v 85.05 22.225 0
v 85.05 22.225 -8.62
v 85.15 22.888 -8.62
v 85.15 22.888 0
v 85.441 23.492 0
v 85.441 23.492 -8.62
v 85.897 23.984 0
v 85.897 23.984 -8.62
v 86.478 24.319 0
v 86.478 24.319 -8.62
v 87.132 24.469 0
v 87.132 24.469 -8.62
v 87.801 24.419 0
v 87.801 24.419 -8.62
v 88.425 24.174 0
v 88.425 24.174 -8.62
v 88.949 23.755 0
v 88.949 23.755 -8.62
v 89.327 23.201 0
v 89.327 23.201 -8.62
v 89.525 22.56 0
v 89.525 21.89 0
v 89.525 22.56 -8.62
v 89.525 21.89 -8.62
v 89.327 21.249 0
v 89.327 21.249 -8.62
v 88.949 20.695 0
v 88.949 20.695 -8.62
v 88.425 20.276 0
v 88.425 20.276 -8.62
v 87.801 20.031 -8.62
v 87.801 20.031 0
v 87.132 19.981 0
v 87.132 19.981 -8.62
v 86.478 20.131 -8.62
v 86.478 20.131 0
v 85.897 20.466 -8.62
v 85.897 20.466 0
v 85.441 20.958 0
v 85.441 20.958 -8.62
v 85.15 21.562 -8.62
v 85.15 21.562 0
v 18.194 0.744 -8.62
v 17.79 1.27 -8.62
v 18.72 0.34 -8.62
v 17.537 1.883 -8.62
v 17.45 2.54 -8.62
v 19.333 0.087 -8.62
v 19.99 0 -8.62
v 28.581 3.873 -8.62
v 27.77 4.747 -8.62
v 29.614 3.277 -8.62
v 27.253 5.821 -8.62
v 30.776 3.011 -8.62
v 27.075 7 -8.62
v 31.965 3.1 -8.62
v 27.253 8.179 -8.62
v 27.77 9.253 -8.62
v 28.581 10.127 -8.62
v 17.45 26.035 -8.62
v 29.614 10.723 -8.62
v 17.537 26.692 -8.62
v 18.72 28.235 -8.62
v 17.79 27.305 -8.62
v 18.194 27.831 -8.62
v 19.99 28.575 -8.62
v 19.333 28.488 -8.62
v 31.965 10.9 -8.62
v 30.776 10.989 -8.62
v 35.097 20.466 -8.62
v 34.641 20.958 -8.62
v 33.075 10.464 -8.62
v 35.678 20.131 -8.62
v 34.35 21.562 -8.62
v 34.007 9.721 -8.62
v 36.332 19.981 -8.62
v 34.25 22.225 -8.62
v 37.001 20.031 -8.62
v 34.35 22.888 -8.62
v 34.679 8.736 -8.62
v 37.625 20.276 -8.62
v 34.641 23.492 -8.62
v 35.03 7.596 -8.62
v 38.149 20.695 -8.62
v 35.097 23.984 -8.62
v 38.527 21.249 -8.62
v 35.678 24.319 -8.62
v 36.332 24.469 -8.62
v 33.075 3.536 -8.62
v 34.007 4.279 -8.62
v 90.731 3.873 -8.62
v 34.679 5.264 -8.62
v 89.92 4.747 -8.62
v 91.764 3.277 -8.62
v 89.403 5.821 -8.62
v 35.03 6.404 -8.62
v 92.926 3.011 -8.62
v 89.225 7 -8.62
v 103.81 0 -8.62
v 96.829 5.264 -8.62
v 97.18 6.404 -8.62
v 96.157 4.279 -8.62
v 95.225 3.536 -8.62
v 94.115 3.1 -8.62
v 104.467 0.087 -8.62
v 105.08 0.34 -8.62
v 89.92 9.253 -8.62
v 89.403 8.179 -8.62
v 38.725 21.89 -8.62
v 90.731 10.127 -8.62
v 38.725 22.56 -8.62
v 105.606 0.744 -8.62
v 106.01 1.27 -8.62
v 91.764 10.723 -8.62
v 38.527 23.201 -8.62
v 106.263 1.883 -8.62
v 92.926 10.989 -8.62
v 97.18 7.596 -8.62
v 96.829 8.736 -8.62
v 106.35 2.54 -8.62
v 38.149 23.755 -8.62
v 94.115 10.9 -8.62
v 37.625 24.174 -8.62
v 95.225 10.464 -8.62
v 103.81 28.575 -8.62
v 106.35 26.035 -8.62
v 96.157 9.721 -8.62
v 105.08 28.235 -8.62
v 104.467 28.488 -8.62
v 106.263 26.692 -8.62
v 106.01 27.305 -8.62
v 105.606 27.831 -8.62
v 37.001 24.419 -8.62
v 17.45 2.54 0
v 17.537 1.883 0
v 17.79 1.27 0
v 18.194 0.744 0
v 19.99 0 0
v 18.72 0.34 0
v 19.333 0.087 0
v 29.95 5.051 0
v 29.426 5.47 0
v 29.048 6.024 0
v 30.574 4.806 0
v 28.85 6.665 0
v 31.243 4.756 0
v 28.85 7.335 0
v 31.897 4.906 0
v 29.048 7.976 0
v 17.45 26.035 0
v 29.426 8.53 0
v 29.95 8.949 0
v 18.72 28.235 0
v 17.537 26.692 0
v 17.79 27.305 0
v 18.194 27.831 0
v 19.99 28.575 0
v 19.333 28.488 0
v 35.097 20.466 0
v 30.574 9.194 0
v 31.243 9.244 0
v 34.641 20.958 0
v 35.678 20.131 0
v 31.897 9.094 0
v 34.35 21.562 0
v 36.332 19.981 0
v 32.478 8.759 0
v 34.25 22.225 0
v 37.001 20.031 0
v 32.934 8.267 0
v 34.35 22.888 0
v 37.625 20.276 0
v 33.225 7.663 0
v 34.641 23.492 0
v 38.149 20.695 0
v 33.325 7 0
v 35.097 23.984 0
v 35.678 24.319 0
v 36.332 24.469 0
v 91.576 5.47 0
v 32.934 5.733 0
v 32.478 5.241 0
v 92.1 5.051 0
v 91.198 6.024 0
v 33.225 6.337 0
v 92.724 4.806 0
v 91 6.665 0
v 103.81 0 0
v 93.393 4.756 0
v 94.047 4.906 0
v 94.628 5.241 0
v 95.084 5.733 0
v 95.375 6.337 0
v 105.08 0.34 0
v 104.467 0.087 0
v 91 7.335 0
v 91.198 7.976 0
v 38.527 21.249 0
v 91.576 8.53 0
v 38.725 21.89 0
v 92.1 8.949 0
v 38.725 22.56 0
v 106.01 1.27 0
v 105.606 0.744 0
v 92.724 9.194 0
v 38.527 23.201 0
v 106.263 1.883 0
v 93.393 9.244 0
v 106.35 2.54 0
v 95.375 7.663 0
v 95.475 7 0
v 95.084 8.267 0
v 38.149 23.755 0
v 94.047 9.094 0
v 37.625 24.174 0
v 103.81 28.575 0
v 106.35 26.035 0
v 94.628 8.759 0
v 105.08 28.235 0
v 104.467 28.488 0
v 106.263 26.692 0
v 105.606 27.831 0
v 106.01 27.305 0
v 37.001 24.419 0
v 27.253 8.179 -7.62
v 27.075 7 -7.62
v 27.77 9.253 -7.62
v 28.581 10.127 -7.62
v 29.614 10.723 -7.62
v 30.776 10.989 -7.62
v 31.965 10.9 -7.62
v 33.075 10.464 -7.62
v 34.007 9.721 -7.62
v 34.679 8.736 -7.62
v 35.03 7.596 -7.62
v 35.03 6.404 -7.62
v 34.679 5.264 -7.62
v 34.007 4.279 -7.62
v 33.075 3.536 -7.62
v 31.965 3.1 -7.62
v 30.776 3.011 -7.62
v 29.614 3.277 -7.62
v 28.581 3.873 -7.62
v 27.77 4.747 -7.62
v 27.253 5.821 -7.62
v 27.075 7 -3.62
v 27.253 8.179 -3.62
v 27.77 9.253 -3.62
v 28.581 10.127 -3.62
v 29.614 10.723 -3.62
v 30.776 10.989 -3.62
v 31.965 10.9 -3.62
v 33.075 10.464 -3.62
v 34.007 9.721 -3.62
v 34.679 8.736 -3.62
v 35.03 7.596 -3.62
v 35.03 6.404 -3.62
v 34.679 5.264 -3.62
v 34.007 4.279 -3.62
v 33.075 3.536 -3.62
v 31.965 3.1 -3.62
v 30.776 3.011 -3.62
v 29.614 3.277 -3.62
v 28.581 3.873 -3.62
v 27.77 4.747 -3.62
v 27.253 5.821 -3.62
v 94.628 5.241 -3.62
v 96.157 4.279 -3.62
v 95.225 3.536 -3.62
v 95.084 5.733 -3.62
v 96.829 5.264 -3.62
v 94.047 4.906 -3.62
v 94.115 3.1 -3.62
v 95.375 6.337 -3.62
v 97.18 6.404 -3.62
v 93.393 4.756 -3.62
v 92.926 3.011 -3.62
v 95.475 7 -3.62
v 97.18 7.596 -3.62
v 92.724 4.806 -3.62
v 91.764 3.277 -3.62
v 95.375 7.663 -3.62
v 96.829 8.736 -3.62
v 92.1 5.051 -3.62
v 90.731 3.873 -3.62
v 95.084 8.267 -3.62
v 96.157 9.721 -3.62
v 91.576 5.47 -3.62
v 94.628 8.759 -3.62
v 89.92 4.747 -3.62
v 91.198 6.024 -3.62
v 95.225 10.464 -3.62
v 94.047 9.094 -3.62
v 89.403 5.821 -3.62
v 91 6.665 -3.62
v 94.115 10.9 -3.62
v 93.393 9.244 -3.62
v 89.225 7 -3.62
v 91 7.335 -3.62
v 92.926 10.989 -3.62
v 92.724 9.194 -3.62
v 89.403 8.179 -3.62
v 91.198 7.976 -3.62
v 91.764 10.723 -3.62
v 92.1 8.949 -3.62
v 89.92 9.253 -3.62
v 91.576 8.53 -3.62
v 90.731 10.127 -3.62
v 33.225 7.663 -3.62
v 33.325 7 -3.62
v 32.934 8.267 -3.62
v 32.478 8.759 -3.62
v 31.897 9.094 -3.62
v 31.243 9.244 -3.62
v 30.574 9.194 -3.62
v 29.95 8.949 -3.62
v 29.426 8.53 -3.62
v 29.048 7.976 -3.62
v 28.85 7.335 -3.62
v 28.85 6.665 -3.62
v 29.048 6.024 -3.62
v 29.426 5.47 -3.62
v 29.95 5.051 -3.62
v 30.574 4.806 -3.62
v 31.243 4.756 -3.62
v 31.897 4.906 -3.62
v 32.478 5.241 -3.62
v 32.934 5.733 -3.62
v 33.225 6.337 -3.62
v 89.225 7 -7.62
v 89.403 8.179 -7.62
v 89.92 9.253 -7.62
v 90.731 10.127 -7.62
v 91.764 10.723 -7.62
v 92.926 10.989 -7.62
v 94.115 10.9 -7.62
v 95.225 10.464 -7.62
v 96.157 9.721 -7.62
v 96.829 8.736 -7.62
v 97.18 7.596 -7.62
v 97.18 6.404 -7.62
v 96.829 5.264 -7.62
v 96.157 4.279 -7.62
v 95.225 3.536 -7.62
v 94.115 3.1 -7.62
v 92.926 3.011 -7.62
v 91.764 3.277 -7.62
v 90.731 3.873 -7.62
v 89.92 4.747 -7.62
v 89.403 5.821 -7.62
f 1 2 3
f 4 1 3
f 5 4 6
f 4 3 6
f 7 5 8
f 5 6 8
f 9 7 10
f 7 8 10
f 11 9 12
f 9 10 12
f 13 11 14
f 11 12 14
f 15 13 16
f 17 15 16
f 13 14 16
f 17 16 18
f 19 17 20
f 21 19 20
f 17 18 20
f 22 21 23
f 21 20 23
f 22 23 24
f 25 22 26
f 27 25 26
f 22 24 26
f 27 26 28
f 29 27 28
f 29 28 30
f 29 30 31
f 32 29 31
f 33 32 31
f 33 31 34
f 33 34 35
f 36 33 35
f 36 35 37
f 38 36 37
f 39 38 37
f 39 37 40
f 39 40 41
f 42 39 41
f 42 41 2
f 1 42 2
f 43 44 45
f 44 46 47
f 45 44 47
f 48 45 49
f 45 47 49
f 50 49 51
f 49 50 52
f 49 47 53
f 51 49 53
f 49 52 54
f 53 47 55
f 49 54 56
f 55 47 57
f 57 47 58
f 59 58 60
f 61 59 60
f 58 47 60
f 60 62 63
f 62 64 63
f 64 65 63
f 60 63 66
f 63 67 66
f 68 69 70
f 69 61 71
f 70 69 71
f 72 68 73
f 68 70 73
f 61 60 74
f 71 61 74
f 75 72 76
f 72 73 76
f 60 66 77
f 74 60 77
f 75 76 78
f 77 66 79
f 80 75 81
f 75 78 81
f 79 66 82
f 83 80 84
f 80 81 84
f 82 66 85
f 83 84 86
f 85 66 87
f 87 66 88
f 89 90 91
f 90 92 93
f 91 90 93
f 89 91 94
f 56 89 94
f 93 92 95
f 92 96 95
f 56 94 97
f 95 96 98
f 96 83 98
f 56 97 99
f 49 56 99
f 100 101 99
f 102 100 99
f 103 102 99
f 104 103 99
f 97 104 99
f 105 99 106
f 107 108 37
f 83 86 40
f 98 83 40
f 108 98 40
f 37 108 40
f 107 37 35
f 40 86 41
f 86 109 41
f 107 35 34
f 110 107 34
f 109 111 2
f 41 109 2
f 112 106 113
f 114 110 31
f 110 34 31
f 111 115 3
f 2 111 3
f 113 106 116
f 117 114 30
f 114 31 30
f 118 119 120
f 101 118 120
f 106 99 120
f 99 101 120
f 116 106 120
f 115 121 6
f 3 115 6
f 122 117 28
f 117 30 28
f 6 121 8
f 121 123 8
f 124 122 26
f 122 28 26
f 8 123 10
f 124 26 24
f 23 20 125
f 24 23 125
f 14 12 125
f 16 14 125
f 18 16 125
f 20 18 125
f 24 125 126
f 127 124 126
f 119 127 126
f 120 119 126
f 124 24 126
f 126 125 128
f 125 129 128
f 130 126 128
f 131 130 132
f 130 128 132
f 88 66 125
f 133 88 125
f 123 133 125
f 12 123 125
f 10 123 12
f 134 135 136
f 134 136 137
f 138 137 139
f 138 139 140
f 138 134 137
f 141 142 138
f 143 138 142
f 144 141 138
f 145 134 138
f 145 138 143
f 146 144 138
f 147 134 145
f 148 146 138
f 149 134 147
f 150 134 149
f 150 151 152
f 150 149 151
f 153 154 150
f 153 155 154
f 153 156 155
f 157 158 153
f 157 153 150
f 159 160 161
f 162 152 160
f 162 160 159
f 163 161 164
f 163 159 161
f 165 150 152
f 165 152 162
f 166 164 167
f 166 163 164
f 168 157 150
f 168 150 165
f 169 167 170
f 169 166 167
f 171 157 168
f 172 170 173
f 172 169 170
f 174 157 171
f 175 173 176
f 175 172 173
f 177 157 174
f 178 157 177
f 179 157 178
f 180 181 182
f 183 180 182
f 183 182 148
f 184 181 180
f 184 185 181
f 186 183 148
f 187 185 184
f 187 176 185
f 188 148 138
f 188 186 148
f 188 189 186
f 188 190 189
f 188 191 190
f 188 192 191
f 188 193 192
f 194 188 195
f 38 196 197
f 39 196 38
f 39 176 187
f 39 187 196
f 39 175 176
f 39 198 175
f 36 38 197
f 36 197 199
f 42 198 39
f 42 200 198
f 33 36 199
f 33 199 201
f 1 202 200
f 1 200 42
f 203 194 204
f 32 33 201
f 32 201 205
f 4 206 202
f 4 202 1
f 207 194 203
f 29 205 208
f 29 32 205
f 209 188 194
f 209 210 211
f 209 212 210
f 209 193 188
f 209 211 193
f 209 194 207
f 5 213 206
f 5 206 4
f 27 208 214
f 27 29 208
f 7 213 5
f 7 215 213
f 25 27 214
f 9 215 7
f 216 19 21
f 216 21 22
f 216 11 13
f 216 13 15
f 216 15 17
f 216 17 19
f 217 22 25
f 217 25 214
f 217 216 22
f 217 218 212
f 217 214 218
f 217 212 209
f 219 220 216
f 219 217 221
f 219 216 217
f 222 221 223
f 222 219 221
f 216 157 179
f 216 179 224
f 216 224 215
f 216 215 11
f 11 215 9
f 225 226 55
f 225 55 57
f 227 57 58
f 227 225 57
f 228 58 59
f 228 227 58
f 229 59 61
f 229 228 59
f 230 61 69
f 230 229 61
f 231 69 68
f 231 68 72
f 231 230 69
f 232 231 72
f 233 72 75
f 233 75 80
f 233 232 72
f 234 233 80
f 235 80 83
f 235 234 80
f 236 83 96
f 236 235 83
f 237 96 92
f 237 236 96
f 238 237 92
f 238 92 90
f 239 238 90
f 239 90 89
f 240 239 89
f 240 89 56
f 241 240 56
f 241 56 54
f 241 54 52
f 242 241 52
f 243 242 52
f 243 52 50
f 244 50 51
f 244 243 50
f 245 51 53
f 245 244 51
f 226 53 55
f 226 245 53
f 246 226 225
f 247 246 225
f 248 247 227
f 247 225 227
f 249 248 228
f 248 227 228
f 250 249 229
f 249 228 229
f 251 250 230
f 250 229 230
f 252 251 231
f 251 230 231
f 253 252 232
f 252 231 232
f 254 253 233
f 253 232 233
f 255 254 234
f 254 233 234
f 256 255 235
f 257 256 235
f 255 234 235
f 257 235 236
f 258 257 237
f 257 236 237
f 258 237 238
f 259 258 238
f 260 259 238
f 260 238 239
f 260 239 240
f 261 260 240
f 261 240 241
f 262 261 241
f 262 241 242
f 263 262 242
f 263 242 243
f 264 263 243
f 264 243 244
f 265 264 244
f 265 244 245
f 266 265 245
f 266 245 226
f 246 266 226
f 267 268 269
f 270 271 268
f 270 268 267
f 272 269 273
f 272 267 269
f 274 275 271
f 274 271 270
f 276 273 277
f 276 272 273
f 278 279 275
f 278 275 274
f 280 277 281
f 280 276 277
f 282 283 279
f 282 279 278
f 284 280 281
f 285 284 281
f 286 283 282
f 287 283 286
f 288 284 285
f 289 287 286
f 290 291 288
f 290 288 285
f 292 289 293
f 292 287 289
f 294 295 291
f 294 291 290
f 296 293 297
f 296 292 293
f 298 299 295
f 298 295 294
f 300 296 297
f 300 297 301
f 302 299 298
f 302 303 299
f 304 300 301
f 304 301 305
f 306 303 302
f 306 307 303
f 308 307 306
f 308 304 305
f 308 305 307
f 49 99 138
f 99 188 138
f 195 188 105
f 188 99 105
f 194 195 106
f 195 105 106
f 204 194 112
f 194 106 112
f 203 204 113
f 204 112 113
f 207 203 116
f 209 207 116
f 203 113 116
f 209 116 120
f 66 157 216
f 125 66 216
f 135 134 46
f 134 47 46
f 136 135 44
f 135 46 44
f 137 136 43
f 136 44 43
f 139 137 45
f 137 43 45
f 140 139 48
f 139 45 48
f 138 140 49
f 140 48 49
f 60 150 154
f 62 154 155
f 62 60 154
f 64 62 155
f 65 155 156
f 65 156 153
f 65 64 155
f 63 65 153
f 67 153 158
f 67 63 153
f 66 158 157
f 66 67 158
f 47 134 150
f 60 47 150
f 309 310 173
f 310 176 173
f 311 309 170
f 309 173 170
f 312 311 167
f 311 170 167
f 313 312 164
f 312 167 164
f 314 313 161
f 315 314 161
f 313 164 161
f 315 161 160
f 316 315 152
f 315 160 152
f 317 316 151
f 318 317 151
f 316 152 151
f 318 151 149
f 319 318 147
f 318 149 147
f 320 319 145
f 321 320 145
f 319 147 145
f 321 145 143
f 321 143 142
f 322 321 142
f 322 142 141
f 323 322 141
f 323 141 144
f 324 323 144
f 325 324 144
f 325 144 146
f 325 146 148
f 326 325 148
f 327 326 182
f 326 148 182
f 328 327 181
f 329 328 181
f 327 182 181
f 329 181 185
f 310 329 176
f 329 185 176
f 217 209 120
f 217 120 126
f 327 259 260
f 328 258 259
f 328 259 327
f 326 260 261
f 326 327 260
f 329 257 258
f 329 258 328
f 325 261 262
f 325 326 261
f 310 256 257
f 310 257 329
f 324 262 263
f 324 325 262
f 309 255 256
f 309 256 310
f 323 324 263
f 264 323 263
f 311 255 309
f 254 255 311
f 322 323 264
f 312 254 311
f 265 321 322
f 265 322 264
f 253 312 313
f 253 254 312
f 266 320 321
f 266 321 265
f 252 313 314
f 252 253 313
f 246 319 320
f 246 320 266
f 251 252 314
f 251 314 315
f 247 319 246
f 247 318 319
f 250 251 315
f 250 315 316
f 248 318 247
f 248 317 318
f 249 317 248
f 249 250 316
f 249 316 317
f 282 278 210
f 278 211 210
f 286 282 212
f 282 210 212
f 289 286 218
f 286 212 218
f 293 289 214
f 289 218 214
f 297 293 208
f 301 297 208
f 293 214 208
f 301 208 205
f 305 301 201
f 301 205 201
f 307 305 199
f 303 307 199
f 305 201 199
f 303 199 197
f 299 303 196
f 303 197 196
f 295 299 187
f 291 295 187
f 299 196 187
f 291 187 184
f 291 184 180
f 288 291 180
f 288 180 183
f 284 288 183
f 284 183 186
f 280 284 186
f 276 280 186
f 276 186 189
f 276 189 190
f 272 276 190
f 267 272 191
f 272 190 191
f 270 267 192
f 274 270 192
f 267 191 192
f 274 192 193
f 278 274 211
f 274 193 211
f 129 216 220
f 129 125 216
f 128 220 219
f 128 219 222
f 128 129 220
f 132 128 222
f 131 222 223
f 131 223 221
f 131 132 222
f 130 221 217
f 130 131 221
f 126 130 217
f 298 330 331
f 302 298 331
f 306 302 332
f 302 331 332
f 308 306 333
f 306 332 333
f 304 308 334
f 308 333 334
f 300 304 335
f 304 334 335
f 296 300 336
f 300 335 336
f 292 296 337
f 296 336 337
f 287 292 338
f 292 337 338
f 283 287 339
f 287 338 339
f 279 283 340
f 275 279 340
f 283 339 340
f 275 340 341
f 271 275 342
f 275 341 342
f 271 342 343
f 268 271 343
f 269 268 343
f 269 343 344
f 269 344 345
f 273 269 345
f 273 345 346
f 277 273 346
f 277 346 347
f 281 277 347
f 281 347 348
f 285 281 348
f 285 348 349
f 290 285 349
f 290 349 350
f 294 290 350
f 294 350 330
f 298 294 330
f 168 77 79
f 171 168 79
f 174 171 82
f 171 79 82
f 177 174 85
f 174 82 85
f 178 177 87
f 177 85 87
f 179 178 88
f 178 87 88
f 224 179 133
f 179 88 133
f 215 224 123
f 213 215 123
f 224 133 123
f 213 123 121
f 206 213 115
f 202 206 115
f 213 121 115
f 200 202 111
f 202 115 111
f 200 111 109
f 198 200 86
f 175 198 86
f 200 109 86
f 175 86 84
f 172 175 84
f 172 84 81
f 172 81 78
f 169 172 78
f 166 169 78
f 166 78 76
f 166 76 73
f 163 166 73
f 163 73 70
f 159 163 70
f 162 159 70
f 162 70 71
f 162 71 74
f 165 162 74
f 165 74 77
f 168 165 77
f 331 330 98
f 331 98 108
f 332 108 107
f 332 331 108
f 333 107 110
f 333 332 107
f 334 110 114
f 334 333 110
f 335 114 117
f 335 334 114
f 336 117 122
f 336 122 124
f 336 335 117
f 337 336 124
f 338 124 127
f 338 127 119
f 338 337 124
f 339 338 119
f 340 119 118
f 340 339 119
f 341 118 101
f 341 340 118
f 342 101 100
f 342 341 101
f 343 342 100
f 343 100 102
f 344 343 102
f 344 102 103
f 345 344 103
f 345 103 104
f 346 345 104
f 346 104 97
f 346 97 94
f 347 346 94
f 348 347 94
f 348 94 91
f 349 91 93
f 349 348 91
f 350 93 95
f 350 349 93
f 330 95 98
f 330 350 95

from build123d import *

# Parameters (mm, degrees)
SKETCH1_W                      = 88.9
SKETCH1_H                      = 15.875
BOSS_EXTRUDE1_DEPTH            = 7.62
CBORE_FOR_M4_SHCS1_D           = 4.5
CBORE_FOR_M4_SHCS1_CBORE_D     = 8
CBORE_FOR_M4_SHCS1_CBORE_DEPTH = 4
SKETCH4_W                      = 88.9
SKETCH4_H                      = 15.875
SKETCH4_R                      = 4
BOSS_EXTRUDE2_DEPTH            = 1
SKETCH5_W                      = 88.9
SKETCH5_H                      = 12.7
SKETCH5_R                      = 2
BOSS_EXTRUDE3_DEPTH            = 8.62
M4_CLEARANCE_HOLE1_D           = 4.5
FILLET1_R                      = 2.54


with BuildPart() as part:
    # Sketch1 → Boss-Extrude1 (new body)
    with BuildSketch(Plane.XY):
        with Locations((61.9, 7.9375)):
            Rectangle(SKETCH1_W, SKETCH1_H)
    extrude(amount=-BOSS_EXTRUDE1_DEPTH)

    # CBORE for M4 SHCS1 (through all)
    with Locations(Plane(origin=(0, 0, -7.62), x_dir=(-1, 0, 0), z_dir=(0, 0, -1))):
        with Locations((-93.225, 7), (-31.075, 7)):
            CounterBoreHole(CBORE_FOR_M4_SHCS1_D / 2, CBORE_FOR_M4_SHCS1_CBORE_D / 2, CBORE_FOR_M4_SHCS1_CBORE_DEPTH)

    # Sketch4 → Boss-Extrude2 (add)
    with BuildSketch(Plane(origin=(0, 0, -7.62), x_dir=(-1, 0, 0), z_dir=(0, 0, -1))):
        with Locations((-61.9, 7.9375)):
            Rectangle(SKETCH4_W, SKETCH4_H)
        with Locations((-93.225, 7)):
            Circle(SKETCH4_R, mode=Mode.SUBTRACT)
        with Locations((-31.075, 7)):
            Circle(SKETCH4_R, mode=Mode.SUBTRACT)
    extrude(amount=BOSS_EXTRUDE2_DEPTH)

    # Sketch5 → Boss-Extrude3 (add)
    with BuildSketch(Plane.XY):
        with Locations((61.9, 22.225)):
            Rectangle(SKETCH5_W, SKETCH5_H)
        with Locations((36.5, 22.225)):
            Circle(SKETCH5_R, mode=Mode.SUBTRACT)
        with Locations((87.3, 22.225)):
            Circle(SKETCH5_R, mode=Mode.SUBTRACT)
        with Locations((36.5, 22.225)):
            Circle(SKETCH5_R)
        with Locations((87.3, 22.225)):
            Circle(SKETCH5_R)
    extrude(amount=-BOSS_EXTRUDE3_DEPTH)

    # M4 Clearance Hole1 (through all)
    with Locations(Plane.XY):
        with Locations((36.5, 22.225), (87.3, 22.225)):
            Hole(M4_CLEARANCE_HOLE1_D / 2)

    # Fillet1
    fillet1_edges = [part.edges().sort_by_distance(p)[0] for p in [
        (17.45, 28.575, -4.31),
        (106.35, 28.575, -4.31),
        (106.35, 0, -4.31),
        (17.45, 0, -4.31),
    ]]
    fillet(fillet1_edges, radius=FILLET1_R)


solid = part.part
